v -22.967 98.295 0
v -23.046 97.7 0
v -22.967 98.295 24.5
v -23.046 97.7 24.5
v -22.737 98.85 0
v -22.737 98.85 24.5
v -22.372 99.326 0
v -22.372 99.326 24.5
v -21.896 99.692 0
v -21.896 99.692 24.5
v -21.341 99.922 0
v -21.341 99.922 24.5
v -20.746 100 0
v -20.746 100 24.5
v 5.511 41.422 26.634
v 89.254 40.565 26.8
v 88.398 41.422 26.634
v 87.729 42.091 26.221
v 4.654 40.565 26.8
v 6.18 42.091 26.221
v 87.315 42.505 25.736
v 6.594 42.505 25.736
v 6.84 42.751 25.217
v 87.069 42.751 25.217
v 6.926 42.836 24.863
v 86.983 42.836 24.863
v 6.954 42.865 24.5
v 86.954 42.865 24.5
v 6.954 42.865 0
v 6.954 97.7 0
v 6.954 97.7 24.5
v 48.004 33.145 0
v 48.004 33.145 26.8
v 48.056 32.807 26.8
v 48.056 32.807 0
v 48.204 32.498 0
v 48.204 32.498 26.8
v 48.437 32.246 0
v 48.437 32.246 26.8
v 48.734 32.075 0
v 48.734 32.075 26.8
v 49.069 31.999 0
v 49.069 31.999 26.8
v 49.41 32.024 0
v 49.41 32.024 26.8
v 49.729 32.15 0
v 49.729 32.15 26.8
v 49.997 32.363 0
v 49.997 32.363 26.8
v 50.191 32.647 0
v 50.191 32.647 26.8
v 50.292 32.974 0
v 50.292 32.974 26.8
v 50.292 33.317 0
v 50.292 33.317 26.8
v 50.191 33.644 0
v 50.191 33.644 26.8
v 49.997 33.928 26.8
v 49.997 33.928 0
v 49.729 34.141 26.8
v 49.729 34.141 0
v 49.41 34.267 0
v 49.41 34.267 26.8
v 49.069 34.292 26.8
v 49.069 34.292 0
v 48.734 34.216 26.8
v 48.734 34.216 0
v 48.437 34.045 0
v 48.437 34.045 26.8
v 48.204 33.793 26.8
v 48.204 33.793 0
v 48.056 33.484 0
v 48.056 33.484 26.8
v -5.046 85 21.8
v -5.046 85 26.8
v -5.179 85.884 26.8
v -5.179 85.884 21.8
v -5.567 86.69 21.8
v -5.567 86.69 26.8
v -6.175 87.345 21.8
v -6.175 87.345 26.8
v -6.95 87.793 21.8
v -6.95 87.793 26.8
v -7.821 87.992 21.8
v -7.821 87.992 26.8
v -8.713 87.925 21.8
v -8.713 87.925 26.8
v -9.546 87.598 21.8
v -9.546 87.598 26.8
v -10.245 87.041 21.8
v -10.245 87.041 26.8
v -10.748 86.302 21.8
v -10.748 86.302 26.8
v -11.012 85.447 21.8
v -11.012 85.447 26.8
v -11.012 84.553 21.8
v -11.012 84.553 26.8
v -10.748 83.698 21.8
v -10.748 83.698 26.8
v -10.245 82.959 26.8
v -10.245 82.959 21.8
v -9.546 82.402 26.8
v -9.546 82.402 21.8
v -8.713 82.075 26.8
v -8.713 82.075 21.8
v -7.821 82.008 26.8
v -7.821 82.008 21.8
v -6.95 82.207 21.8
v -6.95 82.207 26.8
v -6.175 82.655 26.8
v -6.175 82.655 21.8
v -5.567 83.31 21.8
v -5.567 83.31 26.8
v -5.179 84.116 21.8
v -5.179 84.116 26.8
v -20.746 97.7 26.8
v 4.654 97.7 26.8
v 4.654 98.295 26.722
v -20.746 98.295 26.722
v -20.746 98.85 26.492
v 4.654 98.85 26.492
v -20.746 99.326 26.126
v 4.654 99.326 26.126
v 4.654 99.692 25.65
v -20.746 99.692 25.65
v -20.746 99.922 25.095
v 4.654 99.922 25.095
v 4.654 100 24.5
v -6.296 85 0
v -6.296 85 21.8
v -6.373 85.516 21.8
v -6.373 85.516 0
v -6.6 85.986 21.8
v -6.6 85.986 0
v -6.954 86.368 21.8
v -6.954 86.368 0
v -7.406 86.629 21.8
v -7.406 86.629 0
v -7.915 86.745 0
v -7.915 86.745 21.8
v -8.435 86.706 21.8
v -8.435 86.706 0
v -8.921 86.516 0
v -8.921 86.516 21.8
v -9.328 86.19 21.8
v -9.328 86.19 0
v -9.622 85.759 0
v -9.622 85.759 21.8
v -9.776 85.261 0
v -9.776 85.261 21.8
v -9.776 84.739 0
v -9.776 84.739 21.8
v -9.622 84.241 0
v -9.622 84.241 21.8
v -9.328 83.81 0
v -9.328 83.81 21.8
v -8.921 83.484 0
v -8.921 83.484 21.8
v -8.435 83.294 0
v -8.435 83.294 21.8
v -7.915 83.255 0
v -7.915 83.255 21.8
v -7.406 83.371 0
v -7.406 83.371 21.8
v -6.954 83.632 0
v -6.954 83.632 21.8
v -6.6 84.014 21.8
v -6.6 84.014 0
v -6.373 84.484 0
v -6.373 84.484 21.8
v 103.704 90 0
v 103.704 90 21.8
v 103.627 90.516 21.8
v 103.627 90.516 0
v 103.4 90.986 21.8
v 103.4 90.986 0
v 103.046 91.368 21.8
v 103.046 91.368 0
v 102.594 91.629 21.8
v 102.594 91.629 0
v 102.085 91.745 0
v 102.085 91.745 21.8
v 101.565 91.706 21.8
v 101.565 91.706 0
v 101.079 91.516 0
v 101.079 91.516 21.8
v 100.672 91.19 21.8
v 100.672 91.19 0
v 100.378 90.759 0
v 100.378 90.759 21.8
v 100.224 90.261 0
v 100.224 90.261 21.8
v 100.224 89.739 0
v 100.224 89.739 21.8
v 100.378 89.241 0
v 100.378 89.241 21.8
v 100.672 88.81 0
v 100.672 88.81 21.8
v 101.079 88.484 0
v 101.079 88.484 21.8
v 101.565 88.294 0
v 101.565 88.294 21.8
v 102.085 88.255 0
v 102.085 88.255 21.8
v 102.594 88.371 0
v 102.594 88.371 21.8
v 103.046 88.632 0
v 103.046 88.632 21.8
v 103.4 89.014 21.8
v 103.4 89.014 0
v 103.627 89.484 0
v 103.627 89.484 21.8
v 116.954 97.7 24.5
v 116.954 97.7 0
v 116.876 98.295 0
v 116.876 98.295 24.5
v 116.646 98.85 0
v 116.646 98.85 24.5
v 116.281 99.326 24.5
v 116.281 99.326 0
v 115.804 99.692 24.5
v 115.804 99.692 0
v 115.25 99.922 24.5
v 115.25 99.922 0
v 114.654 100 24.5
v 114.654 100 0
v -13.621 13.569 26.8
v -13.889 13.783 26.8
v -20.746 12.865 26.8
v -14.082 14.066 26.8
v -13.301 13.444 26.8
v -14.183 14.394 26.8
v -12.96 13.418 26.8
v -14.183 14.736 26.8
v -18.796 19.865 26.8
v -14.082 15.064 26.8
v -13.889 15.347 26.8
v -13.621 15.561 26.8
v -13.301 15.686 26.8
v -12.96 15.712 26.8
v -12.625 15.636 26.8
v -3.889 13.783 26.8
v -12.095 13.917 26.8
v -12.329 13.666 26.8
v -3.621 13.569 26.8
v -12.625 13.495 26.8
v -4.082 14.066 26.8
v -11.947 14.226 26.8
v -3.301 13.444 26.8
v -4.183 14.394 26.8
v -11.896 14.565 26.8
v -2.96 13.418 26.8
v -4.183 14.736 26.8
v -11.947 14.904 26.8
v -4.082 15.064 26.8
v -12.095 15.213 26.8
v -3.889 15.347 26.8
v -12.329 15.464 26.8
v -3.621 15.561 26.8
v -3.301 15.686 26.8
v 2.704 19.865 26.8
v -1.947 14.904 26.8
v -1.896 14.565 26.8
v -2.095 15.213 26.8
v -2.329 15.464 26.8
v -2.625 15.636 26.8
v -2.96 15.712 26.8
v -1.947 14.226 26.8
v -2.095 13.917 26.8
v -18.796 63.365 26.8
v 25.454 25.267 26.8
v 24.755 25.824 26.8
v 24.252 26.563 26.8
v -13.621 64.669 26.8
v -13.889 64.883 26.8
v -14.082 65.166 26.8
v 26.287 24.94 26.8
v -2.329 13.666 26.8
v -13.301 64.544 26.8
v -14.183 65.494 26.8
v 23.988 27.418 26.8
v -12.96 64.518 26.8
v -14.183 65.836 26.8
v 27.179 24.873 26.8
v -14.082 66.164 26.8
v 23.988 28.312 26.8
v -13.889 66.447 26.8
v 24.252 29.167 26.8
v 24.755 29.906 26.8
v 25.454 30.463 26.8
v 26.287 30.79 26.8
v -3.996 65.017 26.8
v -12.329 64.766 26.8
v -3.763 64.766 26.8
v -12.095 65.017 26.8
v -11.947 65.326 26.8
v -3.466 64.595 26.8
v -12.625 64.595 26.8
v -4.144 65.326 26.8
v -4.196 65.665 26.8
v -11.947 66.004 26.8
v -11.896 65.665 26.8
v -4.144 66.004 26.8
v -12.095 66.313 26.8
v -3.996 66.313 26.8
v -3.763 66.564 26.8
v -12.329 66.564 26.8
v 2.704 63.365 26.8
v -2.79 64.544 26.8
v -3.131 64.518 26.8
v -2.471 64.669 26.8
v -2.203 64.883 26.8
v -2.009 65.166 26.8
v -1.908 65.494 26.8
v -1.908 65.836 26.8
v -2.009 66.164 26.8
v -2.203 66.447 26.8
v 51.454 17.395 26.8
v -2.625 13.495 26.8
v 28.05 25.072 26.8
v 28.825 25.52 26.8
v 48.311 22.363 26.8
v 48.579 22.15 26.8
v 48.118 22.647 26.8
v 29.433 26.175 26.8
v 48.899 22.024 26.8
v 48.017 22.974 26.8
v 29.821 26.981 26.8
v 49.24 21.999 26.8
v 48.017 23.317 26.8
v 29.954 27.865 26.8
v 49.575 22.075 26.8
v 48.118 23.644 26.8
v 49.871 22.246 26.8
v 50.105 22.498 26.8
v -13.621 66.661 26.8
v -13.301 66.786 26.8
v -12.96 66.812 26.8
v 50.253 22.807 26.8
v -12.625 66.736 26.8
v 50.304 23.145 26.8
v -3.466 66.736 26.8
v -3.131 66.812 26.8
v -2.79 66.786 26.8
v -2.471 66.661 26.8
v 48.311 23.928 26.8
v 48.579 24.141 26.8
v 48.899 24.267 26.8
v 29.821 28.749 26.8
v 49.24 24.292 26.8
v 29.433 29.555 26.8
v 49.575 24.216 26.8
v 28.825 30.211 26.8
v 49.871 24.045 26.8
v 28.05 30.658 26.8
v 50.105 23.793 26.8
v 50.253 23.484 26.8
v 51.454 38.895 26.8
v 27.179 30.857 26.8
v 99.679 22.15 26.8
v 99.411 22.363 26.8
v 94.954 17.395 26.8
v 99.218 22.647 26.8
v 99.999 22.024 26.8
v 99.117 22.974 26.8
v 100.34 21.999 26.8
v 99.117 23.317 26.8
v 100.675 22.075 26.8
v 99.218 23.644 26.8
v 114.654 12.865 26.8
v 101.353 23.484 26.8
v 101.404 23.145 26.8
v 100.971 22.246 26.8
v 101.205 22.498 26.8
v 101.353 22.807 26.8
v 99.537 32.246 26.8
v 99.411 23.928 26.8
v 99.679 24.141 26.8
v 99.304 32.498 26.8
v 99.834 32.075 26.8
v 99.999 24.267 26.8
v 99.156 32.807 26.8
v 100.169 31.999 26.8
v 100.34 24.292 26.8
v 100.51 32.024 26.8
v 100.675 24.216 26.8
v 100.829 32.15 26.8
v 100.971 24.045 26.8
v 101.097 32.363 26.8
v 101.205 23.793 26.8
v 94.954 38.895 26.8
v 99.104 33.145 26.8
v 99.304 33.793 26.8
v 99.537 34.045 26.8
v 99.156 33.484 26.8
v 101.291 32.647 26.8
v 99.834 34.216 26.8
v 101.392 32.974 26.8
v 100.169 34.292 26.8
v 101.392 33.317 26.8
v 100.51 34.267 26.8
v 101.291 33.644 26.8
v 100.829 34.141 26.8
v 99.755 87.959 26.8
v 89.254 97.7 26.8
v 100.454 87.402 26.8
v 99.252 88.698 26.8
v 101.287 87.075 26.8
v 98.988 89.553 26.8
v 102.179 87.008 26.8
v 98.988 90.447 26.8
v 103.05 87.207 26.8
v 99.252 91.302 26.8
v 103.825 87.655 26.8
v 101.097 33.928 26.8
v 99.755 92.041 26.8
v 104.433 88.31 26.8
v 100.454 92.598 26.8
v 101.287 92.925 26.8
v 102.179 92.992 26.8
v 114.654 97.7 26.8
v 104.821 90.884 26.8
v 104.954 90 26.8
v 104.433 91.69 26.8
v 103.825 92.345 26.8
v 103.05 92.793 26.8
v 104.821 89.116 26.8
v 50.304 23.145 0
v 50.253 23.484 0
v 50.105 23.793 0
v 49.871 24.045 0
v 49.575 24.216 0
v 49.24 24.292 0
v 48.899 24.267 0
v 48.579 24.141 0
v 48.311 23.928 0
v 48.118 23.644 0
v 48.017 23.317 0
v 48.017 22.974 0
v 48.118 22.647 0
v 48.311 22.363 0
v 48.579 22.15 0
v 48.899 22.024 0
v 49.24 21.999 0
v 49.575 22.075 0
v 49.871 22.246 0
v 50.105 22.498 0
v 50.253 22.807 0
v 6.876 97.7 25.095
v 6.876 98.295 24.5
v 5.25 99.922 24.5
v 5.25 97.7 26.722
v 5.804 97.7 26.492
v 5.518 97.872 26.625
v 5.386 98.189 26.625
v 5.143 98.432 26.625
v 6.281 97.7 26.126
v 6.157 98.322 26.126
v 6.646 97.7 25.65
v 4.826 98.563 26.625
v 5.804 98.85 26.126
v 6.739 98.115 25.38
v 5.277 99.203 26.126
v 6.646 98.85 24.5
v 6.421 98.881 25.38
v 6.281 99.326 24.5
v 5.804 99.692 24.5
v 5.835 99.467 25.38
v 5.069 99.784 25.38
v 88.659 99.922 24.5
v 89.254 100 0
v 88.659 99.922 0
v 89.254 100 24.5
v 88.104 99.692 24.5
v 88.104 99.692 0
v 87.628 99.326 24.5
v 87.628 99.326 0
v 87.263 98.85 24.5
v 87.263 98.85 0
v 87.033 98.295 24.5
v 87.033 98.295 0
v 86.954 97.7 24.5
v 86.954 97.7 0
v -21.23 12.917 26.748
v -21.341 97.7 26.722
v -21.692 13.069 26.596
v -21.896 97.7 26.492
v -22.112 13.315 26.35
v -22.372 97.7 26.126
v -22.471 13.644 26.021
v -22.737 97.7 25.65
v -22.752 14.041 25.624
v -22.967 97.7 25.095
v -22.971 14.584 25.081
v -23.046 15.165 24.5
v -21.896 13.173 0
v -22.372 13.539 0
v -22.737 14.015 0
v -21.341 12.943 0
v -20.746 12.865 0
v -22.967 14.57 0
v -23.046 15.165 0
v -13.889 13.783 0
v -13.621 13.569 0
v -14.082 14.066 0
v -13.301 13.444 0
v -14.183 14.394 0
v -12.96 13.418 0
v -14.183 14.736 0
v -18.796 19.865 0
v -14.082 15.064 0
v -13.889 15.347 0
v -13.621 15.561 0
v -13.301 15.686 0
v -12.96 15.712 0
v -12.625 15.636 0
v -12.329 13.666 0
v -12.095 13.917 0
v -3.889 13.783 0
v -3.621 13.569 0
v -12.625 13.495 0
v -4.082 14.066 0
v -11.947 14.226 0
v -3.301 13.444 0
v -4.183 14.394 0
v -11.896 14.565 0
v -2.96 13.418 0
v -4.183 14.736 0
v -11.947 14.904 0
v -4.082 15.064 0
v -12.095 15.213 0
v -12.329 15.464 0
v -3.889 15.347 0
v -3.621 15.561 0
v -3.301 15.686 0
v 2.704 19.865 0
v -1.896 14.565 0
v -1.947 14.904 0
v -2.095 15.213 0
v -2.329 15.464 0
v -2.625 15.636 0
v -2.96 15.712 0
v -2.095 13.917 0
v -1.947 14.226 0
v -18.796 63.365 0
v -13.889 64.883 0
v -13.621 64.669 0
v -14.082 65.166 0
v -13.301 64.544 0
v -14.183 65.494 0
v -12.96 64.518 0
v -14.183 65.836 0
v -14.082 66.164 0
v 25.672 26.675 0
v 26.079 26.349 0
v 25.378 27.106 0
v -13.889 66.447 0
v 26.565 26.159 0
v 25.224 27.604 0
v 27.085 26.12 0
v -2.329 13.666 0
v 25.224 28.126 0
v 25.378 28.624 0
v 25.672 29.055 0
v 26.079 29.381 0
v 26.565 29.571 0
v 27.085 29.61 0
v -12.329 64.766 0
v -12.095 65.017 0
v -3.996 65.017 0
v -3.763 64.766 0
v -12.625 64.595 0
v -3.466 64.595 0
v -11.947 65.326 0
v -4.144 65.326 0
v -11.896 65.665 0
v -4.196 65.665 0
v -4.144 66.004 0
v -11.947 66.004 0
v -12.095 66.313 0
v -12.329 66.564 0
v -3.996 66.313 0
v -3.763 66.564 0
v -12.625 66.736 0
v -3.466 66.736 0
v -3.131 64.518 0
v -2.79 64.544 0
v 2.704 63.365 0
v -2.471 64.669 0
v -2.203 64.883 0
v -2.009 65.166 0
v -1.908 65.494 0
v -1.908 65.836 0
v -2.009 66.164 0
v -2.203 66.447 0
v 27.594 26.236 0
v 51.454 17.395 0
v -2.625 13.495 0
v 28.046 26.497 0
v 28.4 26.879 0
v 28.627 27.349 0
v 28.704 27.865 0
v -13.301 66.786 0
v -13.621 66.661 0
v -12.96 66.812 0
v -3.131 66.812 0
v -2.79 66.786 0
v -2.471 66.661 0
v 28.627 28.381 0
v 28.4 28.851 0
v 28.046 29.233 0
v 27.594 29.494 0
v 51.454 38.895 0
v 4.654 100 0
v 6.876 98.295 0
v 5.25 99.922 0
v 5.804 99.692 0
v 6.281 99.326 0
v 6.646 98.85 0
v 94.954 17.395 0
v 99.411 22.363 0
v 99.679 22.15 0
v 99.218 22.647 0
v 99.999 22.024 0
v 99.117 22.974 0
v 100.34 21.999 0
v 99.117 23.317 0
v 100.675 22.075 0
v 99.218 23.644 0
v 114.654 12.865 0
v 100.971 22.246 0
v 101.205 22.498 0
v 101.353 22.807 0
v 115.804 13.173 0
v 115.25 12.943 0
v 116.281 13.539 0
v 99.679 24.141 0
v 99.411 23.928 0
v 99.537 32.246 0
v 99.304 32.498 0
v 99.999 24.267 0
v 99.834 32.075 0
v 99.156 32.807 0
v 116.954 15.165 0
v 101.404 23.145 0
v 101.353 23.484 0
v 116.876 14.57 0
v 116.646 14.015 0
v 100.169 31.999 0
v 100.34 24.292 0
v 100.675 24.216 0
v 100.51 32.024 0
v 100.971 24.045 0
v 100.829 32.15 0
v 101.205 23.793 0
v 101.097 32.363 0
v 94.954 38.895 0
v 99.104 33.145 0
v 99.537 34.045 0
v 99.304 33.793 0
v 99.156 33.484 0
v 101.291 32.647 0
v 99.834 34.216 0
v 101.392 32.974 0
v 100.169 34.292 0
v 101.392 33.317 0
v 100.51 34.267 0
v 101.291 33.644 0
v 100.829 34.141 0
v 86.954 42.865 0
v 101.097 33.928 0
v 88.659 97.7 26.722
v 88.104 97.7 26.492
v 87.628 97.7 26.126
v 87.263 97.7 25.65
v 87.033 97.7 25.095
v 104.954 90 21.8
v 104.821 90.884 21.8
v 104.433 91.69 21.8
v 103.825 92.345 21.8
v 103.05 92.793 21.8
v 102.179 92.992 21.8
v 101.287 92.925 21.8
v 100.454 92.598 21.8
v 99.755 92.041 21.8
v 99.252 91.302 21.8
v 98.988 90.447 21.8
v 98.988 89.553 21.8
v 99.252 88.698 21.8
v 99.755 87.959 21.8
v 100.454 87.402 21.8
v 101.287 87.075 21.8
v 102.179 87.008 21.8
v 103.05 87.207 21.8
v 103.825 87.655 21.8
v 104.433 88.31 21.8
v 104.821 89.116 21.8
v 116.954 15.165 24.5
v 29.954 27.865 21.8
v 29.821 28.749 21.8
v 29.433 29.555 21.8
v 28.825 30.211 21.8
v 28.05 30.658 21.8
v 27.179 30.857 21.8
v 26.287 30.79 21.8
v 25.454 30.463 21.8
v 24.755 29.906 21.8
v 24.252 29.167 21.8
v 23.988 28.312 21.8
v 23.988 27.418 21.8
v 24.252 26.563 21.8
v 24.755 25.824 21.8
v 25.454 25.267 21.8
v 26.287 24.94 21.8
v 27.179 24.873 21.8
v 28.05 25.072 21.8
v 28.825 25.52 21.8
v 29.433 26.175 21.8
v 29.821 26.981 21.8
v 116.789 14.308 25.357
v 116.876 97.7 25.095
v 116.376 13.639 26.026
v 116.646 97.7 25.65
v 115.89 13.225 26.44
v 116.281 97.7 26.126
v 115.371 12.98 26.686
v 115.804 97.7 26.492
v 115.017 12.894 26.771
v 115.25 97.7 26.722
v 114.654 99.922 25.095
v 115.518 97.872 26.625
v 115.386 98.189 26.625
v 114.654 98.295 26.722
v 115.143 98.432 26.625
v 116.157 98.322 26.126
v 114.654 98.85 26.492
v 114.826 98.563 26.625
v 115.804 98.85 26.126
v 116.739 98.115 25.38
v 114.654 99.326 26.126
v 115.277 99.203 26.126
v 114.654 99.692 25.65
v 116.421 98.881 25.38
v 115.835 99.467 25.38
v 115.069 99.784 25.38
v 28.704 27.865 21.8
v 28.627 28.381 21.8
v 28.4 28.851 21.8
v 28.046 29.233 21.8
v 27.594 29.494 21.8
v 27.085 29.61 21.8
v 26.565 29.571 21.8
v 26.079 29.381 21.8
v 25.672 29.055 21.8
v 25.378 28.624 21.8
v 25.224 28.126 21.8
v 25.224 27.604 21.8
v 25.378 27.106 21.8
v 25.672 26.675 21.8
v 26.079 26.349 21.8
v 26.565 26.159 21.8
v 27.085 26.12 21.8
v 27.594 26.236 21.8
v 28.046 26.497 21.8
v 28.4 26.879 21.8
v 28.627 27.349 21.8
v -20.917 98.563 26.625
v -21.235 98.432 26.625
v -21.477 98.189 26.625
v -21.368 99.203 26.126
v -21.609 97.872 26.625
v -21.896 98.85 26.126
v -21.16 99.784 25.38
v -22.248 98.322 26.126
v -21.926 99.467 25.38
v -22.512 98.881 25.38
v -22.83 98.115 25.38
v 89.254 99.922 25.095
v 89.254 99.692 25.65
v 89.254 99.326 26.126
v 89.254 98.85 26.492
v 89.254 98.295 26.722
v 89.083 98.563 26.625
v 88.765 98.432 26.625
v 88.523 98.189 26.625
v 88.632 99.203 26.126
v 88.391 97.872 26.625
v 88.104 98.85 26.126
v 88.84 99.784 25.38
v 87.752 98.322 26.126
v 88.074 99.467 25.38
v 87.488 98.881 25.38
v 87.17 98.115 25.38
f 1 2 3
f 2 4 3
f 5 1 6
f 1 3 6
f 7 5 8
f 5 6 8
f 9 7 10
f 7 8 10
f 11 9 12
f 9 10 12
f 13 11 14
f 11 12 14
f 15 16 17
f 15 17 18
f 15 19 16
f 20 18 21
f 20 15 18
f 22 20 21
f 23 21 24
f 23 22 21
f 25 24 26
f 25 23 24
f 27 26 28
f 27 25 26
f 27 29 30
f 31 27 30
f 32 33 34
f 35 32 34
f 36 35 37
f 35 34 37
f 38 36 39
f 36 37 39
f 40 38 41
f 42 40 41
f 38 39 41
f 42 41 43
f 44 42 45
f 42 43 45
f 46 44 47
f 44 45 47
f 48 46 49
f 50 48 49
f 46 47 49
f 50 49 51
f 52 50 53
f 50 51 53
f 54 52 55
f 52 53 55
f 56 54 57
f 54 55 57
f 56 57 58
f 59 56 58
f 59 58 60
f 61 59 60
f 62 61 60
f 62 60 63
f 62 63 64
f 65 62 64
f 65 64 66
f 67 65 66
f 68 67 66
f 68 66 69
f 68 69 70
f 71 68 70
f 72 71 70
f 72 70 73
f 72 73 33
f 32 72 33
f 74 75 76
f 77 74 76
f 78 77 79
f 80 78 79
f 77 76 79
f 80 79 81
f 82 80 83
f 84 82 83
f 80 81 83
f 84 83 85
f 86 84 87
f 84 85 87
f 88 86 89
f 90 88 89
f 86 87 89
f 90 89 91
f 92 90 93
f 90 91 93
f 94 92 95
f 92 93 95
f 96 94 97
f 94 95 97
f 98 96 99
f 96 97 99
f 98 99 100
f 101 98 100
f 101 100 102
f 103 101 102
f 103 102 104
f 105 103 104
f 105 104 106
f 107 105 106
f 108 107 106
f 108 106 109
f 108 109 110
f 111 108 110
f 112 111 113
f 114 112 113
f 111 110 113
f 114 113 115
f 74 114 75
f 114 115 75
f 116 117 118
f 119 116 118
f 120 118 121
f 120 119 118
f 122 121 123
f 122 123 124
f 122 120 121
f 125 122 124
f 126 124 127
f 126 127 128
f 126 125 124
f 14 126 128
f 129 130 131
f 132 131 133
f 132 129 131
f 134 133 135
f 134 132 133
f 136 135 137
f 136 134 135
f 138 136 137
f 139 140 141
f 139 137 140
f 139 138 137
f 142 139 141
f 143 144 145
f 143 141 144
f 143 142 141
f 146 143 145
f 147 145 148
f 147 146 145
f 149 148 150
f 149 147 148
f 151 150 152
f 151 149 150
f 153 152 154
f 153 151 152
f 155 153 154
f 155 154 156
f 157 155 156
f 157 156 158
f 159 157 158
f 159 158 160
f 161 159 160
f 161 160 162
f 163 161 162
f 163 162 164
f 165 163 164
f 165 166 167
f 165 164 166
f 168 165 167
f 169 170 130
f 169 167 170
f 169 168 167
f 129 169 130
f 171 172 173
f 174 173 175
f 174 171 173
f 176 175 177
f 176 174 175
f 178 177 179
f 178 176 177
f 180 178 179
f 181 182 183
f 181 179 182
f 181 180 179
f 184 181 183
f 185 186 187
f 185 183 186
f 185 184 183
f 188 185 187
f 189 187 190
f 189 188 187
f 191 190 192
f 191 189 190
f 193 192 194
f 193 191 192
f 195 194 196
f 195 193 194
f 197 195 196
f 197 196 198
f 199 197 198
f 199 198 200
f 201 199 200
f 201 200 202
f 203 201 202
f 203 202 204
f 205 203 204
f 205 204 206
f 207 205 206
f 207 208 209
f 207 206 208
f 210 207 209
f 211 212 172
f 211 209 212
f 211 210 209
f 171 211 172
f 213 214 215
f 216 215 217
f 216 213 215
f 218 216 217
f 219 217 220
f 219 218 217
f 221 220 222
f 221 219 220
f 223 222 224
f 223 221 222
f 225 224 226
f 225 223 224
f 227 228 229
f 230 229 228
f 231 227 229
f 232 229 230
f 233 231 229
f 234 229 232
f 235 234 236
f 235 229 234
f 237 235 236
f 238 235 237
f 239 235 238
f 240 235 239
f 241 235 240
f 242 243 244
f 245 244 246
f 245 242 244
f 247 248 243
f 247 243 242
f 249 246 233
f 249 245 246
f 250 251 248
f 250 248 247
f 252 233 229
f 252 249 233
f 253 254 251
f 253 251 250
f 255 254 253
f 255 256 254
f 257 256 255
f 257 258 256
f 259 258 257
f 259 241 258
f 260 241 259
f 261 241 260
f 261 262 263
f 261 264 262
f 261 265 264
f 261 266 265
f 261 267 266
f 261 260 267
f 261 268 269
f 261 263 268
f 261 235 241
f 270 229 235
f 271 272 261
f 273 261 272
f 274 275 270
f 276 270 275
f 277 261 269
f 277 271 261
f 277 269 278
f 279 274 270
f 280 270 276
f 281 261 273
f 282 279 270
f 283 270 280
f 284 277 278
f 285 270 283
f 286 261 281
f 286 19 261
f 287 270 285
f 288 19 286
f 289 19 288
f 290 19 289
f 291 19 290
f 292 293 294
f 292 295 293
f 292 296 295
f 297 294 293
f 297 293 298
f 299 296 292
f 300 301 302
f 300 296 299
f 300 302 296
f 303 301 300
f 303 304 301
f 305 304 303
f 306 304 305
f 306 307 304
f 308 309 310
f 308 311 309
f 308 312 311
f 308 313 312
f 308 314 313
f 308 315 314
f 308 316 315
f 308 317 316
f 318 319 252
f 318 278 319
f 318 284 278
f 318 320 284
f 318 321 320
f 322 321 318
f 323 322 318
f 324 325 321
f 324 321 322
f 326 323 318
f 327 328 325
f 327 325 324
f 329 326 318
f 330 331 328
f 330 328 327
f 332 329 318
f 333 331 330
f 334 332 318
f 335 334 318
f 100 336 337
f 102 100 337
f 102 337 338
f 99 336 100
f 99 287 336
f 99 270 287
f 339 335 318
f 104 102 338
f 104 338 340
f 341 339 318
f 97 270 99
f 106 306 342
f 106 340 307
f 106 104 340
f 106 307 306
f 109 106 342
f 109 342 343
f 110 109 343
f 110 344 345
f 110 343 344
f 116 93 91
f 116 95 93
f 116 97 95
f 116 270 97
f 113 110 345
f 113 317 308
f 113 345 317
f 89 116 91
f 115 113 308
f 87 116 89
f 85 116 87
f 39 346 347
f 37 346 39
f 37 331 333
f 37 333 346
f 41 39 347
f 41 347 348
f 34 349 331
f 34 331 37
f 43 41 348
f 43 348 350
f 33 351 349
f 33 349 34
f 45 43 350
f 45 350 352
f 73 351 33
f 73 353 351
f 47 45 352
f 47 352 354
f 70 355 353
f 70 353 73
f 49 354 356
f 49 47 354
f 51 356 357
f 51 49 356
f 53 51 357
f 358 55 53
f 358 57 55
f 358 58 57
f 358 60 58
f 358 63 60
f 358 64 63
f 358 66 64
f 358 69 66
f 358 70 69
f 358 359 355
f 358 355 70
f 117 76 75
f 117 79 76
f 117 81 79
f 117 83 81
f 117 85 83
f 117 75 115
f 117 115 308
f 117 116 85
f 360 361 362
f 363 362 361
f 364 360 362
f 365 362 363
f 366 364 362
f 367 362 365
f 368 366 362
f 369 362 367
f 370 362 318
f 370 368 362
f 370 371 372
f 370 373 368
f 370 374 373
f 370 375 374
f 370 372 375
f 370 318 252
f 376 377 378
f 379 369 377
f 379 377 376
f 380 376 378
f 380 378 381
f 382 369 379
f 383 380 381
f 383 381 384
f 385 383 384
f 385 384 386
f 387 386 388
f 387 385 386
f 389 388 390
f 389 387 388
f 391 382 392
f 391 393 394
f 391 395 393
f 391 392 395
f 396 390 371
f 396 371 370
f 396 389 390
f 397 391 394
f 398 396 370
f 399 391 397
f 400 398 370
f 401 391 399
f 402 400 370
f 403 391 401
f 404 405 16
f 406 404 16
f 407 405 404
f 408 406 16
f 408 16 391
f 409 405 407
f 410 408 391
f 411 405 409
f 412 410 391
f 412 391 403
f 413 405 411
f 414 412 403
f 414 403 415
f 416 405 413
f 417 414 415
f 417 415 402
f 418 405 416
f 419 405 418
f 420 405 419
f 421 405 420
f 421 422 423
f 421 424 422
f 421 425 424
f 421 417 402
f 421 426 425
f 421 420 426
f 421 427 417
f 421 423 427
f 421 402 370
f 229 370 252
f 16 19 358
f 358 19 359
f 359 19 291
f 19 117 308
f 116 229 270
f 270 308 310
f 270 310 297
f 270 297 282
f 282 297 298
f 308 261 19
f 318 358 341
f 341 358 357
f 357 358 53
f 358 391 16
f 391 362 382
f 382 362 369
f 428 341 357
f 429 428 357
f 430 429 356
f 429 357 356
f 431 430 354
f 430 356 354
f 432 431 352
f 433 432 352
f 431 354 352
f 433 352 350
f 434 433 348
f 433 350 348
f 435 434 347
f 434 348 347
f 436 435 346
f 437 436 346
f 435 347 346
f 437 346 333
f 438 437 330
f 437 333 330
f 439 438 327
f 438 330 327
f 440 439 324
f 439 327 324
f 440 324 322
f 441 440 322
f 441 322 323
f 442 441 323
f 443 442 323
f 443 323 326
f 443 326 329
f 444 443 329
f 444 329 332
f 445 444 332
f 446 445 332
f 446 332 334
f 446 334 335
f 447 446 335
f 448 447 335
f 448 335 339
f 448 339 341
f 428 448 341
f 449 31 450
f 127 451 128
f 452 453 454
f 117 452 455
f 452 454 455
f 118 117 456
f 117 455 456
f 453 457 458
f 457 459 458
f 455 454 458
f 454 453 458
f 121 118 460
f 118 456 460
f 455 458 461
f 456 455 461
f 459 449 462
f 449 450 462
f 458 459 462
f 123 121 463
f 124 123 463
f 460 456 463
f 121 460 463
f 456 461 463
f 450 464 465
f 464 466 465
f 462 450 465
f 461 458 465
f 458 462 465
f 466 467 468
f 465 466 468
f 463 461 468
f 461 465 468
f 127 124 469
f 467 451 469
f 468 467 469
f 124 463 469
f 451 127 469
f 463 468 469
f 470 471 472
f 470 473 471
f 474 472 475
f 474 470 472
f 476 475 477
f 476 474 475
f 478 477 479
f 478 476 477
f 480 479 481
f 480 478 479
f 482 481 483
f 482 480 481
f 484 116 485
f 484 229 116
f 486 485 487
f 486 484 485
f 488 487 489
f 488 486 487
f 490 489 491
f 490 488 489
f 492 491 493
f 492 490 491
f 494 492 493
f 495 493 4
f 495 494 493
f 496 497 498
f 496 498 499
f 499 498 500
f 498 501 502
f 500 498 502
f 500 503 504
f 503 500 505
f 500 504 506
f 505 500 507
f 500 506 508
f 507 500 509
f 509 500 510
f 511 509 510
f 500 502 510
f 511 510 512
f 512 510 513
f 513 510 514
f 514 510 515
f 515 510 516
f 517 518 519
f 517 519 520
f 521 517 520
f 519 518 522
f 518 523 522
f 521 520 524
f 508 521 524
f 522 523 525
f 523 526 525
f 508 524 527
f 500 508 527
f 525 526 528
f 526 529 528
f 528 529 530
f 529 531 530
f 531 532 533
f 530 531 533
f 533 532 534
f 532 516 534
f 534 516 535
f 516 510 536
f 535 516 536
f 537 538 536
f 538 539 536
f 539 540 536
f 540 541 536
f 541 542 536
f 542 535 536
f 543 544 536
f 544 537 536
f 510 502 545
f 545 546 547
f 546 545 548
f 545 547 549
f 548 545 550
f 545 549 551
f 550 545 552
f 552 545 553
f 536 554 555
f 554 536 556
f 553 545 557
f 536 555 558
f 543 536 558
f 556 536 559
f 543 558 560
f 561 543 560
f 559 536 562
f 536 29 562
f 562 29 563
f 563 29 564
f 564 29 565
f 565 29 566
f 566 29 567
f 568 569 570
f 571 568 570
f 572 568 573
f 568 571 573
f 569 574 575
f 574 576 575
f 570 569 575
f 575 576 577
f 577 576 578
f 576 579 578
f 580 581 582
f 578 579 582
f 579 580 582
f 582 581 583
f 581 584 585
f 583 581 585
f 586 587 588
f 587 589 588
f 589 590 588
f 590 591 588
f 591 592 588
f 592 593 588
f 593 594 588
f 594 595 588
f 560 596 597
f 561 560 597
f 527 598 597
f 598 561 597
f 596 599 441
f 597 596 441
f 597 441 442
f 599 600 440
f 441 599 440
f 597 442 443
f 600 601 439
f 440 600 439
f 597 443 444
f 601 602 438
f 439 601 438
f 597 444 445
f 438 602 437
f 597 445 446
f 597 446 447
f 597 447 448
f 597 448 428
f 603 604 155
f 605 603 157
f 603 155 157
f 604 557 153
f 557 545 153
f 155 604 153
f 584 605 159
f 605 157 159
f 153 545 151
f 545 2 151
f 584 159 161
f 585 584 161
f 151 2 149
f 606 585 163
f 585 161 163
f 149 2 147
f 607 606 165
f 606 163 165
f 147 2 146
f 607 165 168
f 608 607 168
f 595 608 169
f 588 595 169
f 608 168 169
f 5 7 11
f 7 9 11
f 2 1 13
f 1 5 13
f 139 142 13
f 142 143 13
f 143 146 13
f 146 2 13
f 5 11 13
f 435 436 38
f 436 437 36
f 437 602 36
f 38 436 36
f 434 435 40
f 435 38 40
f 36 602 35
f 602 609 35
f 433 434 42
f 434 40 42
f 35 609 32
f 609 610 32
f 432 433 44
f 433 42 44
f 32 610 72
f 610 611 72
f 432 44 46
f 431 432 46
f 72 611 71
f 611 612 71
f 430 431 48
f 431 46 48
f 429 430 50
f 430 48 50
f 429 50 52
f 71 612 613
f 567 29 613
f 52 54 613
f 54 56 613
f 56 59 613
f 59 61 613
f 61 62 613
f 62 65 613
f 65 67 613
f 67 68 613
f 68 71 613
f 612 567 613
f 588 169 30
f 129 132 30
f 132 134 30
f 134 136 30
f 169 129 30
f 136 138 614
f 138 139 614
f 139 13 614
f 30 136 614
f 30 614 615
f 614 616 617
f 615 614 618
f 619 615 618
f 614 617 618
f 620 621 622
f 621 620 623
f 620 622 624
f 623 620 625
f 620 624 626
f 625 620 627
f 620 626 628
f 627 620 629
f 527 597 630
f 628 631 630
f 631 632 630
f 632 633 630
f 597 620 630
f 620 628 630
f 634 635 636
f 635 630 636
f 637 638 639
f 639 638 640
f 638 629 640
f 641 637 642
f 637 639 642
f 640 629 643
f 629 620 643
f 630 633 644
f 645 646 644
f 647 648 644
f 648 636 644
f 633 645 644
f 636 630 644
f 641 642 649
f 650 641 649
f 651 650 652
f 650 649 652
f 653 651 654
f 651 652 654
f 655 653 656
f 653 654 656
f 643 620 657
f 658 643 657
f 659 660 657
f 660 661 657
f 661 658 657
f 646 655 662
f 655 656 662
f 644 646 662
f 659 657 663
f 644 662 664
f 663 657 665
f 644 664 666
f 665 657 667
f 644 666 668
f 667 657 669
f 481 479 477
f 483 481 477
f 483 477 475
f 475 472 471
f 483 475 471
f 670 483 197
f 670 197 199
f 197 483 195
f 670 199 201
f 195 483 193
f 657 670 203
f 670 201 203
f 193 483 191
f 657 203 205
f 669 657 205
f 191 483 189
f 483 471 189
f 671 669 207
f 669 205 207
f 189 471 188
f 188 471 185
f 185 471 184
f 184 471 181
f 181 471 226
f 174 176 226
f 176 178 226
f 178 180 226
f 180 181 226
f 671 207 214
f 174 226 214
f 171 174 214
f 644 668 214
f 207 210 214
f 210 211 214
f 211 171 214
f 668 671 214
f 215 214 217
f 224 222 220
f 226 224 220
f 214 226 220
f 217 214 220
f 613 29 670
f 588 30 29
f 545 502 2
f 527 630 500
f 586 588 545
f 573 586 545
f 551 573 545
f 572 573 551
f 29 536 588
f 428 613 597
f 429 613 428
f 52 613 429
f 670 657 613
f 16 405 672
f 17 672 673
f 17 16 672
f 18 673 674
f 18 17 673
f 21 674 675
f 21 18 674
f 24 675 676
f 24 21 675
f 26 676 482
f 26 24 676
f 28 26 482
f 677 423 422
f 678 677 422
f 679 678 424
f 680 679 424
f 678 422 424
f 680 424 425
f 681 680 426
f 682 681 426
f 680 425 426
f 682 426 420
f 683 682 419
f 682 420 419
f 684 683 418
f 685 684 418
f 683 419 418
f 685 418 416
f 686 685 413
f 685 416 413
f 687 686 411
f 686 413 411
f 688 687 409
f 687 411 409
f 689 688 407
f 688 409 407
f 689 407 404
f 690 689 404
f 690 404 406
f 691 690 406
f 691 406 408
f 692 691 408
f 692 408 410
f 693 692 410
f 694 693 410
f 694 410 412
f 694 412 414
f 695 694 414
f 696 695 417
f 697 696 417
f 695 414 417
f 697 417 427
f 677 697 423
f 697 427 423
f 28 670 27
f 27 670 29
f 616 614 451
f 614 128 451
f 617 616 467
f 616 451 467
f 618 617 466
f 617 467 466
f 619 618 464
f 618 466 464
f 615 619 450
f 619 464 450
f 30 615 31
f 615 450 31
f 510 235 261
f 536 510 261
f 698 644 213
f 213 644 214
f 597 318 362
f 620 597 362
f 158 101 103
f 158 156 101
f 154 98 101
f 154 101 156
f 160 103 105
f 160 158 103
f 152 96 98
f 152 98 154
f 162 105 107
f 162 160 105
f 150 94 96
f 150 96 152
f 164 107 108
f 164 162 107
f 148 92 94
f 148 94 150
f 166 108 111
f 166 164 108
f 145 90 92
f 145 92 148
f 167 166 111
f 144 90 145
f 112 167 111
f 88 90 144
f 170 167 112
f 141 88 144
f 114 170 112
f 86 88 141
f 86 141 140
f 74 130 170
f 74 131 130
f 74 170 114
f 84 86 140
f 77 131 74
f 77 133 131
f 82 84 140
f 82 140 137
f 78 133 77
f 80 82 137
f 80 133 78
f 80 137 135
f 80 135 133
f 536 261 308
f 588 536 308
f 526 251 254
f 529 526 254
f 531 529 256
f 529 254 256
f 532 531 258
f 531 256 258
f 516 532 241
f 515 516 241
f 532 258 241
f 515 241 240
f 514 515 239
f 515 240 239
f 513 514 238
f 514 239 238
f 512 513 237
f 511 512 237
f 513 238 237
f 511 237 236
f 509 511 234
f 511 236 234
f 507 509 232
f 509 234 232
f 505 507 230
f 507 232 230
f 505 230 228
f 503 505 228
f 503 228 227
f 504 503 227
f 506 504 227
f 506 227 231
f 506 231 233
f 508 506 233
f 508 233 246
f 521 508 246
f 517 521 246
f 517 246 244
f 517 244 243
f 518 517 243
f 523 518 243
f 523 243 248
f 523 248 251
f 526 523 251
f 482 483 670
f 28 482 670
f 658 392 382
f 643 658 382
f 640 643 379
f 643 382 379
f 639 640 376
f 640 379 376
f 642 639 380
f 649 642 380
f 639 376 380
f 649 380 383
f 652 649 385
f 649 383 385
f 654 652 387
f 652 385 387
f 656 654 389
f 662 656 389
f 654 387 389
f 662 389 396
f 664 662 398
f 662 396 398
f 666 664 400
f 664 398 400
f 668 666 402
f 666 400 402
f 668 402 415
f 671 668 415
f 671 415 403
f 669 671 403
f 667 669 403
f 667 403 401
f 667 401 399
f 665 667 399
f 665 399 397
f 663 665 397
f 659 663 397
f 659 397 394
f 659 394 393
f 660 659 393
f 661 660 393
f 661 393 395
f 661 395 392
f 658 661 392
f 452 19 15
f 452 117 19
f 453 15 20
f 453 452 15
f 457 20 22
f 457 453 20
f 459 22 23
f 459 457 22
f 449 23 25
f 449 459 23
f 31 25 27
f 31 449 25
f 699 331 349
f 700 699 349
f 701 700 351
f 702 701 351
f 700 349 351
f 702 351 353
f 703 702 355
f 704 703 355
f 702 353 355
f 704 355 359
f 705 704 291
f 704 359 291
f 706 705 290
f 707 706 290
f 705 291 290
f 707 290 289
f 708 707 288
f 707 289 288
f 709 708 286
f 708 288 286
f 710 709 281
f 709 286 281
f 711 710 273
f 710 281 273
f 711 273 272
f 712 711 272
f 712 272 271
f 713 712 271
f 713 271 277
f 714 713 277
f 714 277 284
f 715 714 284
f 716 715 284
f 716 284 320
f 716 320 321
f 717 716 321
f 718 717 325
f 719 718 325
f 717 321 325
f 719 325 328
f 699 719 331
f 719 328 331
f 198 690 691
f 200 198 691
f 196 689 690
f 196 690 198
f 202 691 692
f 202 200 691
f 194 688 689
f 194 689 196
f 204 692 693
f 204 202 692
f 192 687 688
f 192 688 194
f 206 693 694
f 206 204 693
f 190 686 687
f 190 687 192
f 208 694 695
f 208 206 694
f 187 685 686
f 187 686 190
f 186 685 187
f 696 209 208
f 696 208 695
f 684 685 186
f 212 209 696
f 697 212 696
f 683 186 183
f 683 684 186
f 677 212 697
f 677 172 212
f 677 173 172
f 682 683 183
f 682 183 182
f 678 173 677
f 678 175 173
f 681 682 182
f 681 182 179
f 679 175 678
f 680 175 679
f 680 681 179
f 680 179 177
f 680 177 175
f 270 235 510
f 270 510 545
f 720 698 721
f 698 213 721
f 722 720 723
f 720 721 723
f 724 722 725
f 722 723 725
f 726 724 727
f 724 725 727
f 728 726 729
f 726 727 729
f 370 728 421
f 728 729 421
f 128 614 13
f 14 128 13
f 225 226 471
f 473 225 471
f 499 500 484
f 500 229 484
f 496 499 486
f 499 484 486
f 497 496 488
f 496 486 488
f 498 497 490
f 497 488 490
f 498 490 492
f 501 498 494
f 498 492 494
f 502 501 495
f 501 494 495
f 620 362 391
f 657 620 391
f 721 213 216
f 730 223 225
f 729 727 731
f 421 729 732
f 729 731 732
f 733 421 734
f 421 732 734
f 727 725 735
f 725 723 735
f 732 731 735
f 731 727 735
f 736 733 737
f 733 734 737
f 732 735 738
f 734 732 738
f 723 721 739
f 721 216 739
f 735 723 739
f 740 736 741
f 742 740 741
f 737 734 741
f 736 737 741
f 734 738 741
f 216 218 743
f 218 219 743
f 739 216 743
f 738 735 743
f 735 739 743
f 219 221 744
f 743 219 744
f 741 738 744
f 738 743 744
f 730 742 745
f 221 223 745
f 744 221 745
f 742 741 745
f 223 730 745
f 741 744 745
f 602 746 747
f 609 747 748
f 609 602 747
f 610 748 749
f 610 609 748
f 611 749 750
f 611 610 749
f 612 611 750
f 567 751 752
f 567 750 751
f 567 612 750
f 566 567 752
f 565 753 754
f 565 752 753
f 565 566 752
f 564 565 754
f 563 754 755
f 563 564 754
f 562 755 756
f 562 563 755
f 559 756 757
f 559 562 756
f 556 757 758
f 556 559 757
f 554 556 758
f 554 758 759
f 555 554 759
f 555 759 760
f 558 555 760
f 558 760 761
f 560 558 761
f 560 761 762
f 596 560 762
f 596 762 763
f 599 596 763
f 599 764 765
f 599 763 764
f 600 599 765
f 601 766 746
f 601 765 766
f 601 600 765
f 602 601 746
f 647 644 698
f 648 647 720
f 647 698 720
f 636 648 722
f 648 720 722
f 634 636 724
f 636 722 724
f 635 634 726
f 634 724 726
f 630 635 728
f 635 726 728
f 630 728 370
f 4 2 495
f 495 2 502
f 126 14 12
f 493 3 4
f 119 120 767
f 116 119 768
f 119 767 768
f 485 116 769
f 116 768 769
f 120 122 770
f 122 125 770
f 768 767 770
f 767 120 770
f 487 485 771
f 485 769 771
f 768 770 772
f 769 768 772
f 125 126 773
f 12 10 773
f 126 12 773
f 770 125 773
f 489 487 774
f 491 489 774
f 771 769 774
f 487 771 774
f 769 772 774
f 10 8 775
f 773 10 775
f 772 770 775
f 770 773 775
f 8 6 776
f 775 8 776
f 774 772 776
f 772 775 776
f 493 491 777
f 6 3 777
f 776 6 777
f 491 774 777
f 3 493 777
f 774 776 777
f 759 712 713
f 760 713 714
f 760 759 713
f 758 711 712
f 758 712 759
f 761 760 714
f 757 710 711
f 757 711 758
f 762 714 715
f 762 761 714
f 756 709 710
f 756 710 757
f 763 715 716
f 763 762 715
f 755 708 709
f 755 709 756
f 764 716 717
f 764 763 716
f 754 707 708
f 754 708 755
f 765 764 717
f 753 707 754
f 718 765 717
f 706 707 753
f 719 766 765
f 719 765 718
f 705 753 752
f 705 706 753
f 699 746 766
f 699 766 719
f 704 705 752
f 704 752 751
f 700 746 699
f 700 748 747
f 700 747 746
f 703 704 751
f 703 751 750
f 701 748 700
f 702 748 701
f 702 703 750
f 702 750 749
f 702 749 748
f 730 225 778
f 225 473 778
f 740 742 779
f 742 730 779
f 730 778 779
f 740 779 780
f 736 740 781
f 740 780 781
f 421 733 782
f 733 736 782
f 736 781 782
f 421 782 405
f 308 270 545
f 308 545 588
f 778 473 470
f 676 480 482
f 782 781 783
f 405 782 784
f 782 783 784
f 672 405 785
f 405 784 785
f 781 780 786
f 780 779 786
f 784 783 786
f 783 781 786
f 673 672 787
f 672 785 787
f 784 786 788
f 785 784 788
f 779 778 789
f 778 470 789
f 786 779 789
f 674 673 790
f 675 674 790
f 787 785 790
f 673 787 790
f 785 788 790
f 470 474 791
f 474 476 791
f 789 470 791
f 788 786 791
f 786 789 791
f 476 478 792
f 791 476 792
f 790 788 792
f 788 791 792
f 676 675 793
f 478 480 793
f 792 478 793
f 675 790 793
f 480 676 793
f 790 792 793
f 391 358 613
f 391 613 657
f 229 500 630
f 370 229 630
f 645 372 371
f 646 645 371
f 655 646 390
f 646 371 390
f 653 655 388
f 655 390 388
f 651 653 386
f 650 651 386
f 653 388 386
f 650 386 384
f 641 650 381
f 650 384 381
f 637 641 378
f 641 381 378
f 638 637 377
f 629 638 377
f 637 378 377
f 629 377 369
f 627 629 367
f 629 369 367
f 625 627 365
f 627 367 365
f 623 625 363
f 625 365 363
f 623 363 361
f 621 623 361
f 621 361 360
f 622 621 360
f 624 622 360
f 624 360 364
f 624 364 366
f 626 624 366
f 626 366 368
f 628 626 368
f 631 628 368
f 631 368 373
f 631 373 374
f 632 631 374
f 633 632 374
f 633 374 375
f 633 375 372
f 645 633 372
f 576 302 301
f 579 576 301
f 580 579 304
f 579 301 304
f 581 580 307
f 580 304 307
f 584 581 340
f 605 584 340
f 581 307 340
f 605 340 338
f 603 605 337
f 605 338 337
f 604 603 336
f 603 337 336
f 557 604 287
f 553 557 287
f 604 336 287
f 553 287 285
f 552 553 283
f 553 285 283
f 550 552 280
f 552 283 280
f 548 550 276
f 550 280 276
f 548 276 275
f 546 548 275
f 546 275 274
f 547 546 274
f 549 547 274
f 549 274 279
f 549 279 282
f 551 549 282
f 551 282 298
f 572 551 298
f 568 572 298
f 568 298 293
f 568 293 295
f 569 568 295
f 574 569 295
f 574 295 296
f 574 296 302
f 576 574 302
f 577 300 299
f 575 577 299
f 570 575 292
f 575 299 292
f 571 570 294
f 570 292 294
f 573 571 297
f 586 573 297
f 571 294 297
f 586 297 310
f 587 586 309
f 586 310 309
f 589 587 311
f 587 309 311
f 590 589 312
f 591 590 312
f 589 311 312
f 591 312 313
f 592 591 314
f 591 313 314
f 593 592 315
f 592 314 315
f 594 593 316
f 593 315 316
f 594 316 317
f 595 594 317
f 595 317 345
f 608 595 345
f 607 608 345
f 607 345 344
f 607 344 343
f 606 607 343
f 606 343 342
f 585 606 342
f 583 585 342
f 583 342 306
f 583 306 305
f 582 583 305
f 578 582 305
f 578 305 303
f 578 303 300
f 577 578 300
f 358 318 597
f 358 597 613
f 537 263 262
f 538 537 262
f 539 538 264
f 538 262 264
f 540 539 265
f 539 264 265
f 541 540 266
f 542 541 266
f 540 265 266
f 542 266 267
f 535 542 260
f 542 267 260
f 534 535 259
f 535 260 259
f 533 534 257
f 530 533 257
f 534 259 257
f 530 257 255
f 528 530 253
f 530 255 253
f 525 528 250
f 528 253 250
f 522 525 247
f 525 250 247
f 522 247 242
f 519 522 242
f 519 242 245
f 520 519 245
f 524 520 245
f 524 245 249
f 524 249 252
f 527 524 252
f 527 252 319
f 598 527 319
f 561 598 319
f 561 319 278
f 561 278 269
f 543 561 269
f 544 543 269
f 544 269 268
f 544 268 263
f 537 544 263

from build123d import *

# Parameters (mm, degrees)
BOSS_EXTRUDE1_DEPTH = 26.8
SKETCH2_W           = 21.5
SKETCH2_H           = 43.5
SKETCH2_W_2         = 43.5
SKETCH2_H_2         = 21.5
CUT_EXTRUDE1_DEPTH  = 157.194070808
SKETCH3_R           = 1.15
BOSS_EXTRUDE2_DEPTH = 26.8
SKETCH3_2_R         = 1.15
CUT_EXTRUDE2_DEPTH  = 157.194070808
SKETCH4_R           = 1.15
CUT_EXTRUDE3_DEPTH  = 157.194070808
FILLET1_R           = 2.3
SKETCH6_R           = 1.75
CUT_EXTRUDE4_DEPTH  = 157.194070808
SKETCH7_R           = 3
CUT_EXTRUDE5_DEPTH  = 5


with BuildPart() as part:
    # Sketch1 → Boss-Extrude1 (new body)
    with BuildSketch(Plane.XY):
        Polygon((86.954468728, 12.865007186), (116.954468728, 12.865007186), (116.954468728, 100), (86.954468728, 100), (86.954468728, 42.865007186), (6.954468728, 42.865007186), (6.954468728, 100), (-23.045531272, 100), (-23.045531272, 12.865007186), (6.954468728, 12.865007186), align=None)
    extrude(amount=BOSS_EXTRUDE1_DEPTH)

    # Sketch2 → Cut-Extrude1 (cut, through all)
    with BuildSketch(Plane.XY.offset(26.8)):
        with Locations((-8.045531272, 41.615007186)):
            Rectangle(SKETCH2_W, SKETCH2_H)
        with Locations((73.204468728, 28.145492547)):
            Rectangle(SKETCH2_W_2, SKETCH2_H_2)
    extrude(amount=-CUT_EXTRUDE1_DEPTH, mode=Mode.SUBTRACT)

    # Sketch3 → Boss-Extrude2 (add, through all)
    with BuildSketch(Plane.XY.offset(26.8)):
        with Locations((-13.045531272, 14.565007186)):
            Circle(SKETCH3_R)
        with Locations((-3.045531272, 14.565007186)):
            Circle(SKETCH3_R)
        with Locations((-13.045531272, 65.665007186)):
            Circle(SKETCH3_R)
        with Locations((-3.045531272, 65.665007186)):
            Circle(SKETCH3_R)
    extrude(amount=-BOSS_EXTRUDE2_DEPTH)

    # Sketch3<2> → Cut-Extrude2 (cut, through all)
    with BuildSketch(Plane.XY.offset(26.8)):
        with Locations((-13.045531272, 14.565007186)):
            Circle(SKETCH3_2_R)
        with Locations((-3.045531272, 14.565007186)):
            Circle(SKETCH3_2_R)
        with Locations((-13.045531272, 65.665007186)):
            Circle(SKETCH3_2_R)
        with Locations(Location((-3.045531272, 65.665007186, 0), (0, 0, 180))):
            Circle(SKETCH3_2_R)
    extrude(amount=-CUT_EXTRUDE2_DEPTH, mode=Mode.SUBTRACT)

    # Sketch4 → Cut-Extrude3 (cut, through all)
    with BuildSketch(Plane.XY.offset(26.8)):
        with Locations((100.254468728, 23.145492547)):
            Circle(SKETCH4_R)
        with Locations(Location((100.254468728, 33.145492547, 0), (0, 0, 180))):
            Circle(SKETCH4_R)
        with Locations((49.154468728, 23.145492547)):
            Circle(SKETCH4_R)
        with Locations(Location((49.154468728, 33.145492547, 0), (0, 0, 180))):
            Circle(SKETCH4_R)
    extrude(amount=-CUT_EXTRUDE3_DEPTH, mode=Mode.SUBTRACT)

    # Fillet1
    fillet1_edges = [part.edges().sort_by_distance(p)[0] for p in [
        (6.954468728, 100, 13.4),
        (86.954468728, 100, 13.4),
        (116.954468728, 100, 13.4),
        (116.954468728, 12.865007186, 13.4),
        (-23.045531272, 12.865007186, 13.4),
        (-23.045531272, 100, 13.4),
        (116.954468728, 56.432503593, 26.8),
        (101.954468728, 100, 26.8),
        (86.954468728, 71.432503593, 26.8),
        (46.954468728, 42.865007186, 26.8),
        (6.954468728, 71.432503593, 26.8),
        (-8.045531272, 100, 26.8),
        (-23.045531272, 56.432503593, 26.8),
    ]]
    fillet(fillet1_edges, radius=FILLET1_R)

    # Sketch6 → Cut-Extrude4 (cut, through all)
    with BuildSketch(Plane.XY):
        with Locations((101.954468728, 90)):
            Circle(SKETCH6_R)
        with Locations((-8.045531272, 85)):
            Circle(SKETCH6_R)
        with Locations((26.954468728, 27.865007186)):
            Circle(SKETCH6_R)
    extrude(amount=CUT_EXTRUDE4_DEPTH, mode=Mode.SUBTRACT)

    # Sketch7 → Cut-Extrude5 (cut)
    with BuildSketch(Plane.XY.offset(26.8)):
        with Locations((-8.045531272, 85)):
            Circle(SKETCH7_R)
        with Locations((26.954468728, 27.865007186)):
            Circle(SKETCH7_R)
        with Locations((101.954468728, 90)):
            Circle(SKETCH7_R)
    extrude(amount=-CUT_EXTRUDE5_DEPTH, mode=Mode.SUBTRACT)


solid = part.part
